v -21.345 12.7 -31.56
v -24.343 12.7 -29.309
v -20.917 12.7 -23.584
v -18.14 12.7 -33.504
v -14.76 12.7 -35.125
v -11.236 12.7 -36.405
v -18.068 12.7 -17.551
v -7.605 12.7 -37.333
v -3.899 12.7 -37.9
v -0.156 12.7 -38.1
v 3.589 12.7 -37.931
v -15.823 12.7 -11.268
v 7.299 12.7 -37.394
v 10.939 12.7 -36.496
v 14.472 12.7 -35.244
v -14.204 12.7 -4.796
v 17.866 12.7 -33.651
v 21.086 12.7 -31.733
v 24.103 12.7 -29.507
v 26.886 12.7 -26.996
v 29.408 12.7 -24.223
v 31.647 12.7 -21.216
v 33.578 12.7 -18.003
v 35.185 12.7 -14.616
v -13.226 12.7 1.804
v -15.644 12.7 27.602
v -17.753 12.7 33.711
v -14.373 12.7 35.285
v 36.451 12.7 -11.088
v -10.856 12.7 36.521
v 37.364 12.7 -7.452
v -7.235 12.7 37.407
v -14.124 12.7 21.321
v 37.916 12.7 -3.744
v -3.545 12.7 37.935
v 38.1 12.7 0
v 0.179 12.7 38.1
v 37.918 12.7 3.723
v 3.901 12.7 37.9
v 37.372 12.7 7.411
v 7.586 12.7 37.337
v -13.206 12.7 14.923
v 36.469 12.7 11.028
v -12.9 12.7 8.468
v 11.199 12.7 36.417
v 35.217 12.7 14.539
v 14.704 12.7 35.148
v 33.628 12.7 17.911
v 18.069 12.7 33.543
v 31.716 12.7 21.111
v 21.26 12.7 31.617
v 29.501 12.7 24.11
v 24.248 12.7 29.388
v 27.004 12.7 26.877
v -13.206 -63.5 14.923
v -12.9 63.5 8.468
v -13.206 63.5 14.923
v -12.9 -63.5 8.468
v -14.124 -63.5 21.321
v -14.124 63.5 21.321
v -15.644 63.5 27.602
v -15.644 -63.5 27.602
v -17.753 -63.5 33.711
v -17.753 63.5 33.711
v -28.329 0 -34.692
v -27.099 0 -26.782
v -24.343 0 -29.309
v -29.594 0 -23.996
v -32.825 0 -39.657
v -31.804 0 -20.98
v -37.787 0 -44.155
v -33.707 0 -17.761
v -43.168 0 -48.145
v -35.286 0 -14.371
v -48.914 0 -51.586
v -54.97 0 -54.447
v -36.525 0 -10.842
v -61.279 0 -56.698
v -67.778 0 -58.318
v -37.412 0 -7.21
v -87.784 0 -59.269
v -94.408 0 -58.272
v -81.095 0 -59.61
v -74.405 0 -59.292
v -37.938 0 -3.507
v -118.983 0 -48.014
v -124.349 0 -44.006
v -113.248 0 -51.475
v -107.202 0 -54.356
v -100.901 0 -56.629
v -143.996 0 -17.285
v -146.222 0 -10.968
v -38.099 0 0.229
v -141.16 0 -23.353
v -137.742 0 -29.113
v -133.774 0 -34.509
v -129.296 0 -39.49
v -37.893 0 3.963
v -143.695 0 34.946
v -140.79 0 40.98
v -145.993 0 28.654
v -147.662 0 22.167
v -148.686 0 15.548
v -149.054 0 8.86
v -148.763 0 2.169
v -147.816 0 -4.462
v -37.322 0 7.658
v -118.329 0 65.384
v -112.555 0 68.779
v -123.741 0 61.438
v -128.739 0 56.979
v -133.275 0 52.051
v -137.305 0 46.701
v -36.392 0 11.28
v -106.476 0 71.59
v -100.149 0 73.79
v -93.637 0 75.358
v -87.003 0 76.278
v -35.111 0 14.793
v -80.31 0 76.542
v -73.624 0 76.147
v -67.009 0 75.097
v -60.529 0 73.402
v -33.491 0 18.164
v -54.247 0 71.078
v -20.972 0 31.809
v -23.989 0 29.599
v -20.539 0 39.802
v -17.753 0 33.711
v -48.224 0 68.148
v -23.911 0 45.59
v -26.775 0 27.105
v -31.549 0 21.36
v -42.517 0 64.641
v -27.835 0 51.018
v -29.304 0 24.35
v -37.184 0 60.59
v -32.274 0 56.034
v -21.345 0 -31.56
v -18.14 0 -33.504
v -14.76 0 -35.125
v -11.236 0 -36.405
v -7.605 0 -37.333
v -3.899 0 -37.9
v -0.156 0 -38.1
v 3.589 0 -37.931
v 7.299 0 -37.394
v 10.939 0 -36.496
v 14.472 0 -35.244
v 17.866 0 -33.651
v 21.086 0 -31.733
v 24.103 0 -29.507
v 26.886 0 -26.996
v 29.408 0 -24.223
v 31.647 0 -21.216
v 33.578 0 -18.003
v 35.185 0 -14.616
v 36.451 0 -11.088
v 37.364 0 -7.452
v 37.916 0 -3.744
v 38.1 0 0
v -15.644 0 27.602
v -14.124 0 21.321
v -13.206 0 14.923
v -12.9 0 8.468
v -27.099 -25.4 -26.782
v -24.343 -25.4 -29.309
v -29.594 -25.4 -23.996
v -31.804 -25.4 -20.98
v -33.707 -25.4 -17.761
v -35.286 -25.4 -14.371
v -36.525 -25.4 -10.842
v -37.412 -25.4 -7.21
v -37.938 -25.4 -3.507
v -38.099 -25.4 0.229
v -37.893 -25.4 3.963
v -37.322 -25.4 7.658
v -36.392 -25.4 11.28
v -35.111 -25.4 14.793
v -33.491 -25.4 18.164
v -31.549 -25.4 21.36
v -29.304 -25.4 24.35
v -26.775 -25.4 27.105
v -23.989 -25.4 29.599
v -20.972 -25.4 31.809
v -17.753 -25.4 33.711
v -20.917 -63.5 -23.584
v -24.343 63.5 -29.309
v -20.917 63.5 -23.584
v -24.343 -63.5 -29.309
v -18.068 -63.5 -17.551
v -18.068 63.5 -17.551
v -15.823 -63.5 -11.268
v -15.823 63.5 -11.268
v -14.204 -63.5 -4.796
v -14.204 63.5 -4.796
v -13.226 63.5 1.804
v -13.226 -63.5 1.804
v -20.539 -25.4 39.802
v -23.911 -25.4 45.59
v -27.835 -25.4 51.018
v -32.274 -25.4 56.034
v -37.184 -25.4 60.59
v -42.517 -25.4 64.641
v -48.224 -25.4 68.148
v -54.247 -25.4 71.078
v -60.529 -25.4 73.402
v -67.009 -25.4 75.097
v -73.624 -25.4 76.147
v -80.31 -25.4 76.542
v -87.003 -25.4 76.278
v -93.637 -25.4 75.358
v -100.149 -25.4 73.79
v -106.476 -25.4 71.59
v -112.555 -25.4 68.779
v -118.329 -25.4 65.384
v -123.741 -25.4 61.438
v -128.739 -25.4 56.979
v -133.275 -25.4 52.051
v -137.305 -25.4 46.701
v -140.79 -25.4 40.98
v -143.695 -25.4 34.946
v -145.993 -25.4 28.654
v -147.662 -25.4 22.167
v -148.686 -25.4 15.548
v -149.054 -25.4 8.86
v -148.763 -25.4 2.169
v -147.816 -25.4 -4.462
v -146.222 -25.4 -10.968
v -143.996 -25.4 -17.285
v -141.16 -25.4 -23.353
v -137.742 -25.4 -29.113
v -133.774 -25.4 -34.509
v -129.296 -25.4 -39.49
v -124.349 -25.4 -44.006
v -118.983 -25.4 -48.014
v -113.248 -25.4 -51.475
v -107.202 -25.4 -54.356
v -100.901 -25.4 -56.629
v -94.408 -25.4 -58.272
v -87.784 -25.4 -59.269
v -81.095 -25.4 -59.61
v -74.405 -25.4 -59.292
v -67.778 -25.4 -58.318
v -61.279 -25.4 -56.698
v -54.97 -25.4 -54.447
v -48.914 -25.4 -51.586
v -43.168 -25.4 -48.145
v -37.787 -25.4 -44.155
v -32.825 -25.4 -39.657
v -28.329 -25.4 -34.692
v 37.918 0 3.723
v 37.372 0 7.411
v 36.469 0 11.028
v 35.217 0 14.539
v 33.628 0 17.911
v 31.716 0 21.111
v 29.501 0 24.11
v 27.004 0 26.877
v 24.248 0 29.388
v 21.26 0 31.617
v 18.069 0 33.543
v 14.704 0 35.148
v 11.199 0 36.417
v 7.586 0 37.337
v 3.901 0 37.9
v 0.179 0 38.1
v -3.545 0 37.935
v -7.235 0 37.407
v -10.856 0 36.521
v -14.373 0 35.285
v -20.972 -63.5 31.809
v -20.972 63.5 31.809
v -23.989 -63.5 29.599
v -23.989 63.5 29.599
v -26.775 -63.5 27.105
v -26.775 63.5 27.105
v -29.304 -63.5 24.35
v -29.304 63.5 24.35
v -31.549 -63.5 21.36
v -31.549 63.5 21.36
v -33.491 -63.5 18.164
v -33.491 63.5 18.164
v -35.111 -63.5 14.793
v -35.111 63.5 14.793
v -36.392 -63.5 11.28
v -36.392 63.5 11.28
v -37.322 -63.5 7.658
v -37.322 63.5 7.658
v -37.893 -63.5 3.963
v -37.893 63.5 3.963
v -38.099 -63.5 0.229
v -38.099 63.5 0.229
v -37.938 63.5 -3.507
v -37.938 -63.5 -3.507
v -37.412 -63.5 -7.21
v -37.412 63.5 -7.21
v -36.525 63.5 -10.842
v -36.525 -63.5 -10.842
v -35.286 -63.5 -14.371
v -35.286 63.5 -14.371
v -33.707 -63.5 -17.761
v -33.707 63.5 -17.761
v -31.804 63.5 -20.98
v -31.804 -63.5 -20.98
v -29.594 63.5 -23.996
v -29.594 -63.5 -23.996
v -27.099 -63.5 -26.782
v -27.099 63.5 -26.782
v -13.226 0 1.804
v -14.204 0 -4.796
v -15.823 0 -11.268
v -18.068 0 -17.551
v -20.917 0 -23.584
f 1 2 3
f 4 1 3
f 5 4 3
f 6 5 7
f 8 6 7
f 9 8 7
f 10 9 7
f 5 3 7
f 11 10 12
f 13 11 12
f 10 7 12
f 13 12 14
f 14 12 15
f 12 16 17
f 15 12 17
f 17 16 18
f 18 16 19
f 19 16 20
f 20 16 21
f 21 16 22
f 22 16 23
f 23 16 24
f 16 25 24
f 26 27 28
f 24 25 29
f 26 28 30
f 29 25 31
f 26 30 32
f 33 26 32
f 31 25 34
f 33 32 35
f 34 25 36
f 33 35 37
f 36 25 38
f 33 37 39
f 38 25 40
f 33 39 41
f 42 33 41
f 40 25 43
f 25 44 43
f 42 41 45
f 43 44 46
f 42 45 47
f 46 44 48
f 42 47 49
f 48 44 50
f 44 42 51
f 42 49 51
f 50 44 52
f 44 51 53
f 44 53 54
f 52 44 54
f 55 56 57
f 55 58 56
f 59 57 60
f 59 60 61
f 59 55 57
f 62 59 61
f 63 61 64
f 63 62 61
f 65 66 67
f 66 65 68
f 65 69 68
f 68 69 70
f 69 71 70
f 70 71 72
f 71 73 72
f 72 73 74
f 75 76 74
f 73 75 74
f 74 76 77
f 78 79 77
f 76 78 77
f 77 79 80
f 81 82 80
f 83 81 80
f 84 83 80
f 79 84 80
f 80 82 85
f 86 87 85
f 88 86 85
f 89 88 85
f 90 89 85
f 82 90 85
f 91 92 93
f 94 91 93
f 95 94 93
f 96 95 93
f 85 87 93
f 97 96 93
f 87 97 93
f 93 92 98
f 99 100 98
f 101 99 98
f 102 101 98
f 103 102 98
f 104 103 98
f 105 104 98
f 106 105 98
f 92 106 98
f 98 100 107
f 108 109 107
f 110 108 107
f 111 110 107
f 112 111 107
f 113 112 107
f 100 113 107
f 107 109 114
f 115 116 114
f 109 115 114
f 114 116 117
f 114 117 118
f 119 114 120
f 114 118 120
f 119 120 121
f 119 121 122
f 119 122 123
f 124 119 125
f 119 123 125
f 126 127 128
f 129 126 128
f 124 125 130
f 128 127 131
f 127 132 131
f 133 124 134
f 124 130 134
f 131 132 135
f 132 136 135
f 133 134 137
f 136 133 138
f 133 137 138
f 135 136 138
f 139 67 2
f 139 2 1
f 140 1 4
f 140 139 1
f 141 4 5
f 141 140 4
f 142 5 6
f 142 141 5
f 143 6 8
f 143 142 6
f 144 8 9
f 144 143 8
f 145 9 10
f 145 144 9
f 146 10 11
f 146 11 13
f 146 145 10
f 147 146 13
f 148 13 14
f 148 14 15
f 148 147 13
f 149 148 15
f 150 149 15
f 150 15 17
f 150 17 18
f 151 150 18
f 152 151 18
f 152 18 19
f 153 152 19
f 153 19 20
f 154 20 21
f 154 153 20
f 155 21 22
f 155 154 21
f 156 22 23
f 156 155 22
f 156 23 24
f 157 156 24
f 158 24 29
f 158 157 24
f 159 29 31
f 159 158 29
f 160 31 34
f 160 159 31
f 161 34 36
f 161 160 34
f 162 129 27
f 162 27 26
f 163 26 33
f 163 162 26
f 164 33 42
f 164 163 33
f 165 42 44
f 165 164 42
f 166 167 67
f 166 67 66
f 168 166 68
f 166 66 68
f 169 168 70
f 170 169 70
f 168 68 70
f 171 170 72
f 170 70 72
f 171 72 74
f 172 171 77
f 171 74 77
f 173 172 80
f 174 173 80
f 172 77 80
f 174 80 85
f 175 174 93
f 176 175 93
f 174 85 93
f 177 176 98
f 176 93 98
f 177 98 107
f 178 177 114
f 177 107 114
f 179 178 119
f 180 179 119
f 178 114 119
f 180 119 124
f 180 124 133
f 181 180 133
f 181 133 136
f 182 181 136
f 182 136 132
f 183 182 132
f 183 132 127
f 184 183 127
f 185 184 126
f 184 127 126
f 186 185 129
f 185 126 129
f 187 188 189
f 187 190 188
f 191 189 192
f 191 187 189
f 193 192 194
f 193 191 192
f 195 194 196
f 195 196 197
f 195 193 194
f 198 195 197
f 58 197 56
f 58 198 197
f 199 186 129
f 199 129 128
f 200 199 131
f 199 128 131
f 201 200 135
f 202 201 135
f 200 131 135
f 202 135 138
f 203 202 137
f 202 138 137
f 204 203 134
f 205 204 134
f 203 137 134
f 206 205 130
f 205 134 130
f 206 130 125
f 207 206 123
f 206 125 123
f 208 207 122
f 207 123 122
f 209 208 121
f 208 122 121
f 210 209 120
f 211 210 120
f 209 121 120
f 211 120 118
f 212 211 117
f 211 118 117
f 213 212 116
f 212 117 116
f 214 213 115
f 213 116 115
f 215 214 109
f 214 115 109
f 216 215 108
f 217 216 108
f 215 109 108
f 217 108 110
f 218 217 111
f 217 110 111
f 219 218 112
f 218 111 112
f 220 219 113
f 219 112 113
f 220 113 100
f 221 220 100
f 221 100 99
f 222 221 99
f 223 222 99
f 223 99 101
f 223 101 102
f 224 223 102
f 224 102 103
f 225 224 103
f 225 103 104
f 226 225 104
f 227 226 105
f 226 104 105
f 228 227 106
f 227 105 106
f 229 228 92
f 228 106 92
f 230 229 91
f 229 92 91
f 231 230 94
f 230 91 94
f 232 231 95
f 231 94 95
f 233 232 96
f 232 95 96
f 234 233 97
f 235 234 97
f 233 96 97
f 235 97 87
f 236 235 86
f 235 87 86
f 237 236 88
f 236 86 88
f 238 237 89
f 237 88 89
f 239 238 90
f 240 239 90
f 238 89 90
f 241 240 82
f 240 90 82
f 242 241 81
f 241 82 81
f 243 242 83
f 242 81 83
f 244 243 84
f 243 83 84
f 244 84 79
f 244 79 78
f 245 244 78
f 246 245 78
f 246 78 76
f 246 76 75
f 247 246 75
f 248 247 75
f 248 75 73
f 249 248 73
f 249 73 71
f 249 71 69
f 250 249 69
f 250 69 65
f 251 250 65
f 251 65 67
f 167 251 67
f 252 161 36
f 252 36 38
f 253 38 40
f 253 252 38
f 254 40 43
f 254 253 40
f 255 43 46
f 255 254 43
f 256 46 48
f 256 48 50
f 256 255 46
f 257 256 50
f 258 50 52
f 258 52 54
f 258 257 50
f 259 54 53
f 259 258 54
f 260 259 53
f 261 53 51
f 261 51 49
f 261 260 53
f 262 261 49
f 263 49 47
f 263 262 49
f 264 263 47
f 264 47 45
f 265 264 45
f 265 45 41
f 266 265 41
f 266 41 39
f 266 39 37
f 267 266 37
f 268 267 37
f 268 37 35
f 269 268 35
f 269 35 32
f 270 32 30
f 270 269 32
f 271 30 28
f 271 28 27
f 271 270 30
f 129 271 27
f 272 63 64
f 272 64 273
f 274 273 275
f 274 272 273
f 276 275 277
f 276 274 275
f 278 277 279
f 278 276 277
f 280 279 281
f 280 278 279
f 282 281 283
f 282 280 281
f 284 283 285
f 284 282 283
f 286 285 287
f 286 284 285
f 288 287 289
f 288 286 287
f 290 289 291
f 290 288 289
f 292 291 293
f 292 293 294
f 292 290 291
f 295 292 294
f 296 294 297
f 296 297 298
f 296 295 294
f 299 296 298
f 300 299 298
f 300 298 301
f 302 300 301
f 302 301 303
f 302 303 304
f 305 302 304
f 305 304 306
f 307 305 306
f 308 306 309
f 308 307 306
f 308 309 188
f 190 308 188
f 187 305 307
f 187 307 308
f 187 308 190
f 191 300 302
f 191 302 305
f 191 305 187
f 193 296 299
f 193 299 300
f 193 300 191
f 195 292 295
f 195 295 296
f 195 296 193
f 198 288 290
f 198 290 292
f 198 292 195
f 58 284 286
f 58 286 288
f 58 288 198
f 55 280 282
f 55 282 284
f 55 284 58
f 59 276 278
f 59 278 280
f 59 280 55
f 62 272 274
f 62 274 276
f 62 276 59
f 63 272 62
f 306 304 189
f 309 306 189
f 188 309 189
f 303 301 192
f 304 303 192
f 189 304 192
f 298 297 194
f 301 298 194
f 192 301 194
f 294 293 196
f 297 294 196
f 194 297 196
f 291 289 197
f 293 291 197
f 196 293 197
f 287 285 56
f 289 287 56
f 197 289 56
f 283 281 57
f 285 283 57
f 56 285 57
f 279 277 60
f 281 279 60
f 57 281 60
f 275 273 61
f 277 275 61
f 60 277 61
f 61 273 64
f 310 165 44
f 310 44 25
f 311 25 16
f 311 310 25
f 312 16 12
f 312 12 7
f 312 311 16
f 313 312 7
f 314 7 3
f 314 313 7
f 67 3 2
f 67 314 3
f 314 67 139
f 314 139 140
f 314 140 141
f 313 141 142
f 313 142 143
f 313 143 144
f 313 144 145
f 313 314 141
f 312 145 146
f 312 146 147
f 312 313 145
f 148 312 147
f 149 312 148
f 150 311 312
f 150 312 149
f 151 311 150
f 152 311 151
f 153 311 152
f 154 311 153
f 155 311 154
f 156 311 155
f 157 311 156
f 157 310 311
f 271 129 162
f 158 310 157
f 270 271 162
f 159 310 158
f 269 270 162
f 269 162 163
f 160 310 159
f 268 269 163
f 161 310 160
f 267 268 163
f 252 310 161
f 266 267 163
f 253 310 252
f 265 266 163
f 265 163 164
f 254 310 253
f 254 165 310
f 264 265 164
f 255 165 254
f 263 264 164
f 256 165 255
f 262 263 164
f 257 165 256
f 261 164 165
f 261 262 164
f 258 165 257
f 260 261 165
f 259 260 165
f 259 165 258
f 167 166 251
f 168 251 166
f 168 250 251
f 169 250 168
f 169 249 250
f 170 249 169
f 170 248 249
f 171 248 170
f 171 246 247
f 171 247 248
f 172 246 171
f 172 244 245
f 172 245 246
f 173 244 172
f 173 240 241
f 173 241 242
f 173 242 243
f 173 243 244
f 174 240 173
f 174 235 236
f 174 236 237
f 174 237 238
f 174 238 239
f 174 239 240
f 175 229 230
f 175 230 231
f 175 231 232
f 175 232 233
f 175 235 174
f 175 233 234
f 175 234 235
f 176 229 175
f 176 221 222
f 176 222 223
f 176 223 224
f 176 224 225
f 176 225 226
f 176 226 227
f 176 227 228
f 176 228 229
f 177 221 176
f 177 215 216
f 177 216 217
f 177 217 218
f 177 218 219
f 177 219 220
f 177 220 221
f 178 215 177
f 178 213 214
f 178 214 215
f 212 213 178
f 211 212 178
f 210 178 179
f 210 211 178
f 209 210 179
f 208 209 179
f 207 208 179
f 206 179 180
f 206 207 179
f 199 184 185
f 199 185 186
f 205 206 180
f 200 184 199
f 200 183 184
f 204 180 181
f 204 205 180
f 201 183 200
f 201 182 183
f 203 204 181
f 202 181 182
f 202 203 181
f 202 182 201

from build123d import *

# Parameters (mm, degrees)
F1_DEPTH      = 25.4
F2_DEPTH      = 12.7
F3_DEPTH      = 63.5
F3_DEPTH_BACK = 63.5


with BuildPart() as f1:
    # F0 (on Front) → F1 (new body)
    with BuildSketch(Plane.XZ):
        with BuildLine():
            ThreePointArc((-24.342829, -29.309327), (-37.893381, 3.962534), (-17.752726, 33.711285))
            ThreePointArc((-17.752726, 33.711285), (-148.685862, 15.54817), (-24.342829, -29.309327))
        make_face()
    extrude(amount=F1_DEPTH)


with BuildPart() as f2:
    # F0 (on Front) → F2 (new body)
    with BuildSketch(Plane.XZ):
        with BuildLine():
            ThreePointArc((-24.342829, -29.309327), (16.188703, -34.489649), (38.1, 0))
            ThreePointArc((38.1, 0), (19.687955, 32.618928), (-17.752726, 33.711285))
            ThreePointArc((-17.752726, 33.711285), (-14.123865, 21.320709), (-12.899566, 8.467846))
            ThreePointArc((-12.899566, 8.467846), (-15.823159, -11.268308), (-24.342829, -29.309327))
        make_face()
    extrude(amount=-F2_DEPTH)


with BuildPart() as f3:
    # F0 (on Front) → F3 (new body, two sides)
    with BuildSketch(Plane.XZ) as f3_sk:
        with BuildLine():
            ThreePointArc((-12.899566, 8.467846), (-14.123865, 21.320709), (-17.752726, 33.711285))
            ThreePointArc((-17.752726, 33.711285), (-37.893381, 3.962534), (-24.342829, -29.309327))
            ThreePointArc((-24.342829, -29.309327), (-15.823159, -11.268308), (-12.899566, 8.467846))
        make_face()
    extrude(amount=F3_DEPTH)
    extrude(f3_sk.sketch, amount=-F3_DEPTH_BACK)


solid = Compound([f1.part, f2.part, f3.part])
